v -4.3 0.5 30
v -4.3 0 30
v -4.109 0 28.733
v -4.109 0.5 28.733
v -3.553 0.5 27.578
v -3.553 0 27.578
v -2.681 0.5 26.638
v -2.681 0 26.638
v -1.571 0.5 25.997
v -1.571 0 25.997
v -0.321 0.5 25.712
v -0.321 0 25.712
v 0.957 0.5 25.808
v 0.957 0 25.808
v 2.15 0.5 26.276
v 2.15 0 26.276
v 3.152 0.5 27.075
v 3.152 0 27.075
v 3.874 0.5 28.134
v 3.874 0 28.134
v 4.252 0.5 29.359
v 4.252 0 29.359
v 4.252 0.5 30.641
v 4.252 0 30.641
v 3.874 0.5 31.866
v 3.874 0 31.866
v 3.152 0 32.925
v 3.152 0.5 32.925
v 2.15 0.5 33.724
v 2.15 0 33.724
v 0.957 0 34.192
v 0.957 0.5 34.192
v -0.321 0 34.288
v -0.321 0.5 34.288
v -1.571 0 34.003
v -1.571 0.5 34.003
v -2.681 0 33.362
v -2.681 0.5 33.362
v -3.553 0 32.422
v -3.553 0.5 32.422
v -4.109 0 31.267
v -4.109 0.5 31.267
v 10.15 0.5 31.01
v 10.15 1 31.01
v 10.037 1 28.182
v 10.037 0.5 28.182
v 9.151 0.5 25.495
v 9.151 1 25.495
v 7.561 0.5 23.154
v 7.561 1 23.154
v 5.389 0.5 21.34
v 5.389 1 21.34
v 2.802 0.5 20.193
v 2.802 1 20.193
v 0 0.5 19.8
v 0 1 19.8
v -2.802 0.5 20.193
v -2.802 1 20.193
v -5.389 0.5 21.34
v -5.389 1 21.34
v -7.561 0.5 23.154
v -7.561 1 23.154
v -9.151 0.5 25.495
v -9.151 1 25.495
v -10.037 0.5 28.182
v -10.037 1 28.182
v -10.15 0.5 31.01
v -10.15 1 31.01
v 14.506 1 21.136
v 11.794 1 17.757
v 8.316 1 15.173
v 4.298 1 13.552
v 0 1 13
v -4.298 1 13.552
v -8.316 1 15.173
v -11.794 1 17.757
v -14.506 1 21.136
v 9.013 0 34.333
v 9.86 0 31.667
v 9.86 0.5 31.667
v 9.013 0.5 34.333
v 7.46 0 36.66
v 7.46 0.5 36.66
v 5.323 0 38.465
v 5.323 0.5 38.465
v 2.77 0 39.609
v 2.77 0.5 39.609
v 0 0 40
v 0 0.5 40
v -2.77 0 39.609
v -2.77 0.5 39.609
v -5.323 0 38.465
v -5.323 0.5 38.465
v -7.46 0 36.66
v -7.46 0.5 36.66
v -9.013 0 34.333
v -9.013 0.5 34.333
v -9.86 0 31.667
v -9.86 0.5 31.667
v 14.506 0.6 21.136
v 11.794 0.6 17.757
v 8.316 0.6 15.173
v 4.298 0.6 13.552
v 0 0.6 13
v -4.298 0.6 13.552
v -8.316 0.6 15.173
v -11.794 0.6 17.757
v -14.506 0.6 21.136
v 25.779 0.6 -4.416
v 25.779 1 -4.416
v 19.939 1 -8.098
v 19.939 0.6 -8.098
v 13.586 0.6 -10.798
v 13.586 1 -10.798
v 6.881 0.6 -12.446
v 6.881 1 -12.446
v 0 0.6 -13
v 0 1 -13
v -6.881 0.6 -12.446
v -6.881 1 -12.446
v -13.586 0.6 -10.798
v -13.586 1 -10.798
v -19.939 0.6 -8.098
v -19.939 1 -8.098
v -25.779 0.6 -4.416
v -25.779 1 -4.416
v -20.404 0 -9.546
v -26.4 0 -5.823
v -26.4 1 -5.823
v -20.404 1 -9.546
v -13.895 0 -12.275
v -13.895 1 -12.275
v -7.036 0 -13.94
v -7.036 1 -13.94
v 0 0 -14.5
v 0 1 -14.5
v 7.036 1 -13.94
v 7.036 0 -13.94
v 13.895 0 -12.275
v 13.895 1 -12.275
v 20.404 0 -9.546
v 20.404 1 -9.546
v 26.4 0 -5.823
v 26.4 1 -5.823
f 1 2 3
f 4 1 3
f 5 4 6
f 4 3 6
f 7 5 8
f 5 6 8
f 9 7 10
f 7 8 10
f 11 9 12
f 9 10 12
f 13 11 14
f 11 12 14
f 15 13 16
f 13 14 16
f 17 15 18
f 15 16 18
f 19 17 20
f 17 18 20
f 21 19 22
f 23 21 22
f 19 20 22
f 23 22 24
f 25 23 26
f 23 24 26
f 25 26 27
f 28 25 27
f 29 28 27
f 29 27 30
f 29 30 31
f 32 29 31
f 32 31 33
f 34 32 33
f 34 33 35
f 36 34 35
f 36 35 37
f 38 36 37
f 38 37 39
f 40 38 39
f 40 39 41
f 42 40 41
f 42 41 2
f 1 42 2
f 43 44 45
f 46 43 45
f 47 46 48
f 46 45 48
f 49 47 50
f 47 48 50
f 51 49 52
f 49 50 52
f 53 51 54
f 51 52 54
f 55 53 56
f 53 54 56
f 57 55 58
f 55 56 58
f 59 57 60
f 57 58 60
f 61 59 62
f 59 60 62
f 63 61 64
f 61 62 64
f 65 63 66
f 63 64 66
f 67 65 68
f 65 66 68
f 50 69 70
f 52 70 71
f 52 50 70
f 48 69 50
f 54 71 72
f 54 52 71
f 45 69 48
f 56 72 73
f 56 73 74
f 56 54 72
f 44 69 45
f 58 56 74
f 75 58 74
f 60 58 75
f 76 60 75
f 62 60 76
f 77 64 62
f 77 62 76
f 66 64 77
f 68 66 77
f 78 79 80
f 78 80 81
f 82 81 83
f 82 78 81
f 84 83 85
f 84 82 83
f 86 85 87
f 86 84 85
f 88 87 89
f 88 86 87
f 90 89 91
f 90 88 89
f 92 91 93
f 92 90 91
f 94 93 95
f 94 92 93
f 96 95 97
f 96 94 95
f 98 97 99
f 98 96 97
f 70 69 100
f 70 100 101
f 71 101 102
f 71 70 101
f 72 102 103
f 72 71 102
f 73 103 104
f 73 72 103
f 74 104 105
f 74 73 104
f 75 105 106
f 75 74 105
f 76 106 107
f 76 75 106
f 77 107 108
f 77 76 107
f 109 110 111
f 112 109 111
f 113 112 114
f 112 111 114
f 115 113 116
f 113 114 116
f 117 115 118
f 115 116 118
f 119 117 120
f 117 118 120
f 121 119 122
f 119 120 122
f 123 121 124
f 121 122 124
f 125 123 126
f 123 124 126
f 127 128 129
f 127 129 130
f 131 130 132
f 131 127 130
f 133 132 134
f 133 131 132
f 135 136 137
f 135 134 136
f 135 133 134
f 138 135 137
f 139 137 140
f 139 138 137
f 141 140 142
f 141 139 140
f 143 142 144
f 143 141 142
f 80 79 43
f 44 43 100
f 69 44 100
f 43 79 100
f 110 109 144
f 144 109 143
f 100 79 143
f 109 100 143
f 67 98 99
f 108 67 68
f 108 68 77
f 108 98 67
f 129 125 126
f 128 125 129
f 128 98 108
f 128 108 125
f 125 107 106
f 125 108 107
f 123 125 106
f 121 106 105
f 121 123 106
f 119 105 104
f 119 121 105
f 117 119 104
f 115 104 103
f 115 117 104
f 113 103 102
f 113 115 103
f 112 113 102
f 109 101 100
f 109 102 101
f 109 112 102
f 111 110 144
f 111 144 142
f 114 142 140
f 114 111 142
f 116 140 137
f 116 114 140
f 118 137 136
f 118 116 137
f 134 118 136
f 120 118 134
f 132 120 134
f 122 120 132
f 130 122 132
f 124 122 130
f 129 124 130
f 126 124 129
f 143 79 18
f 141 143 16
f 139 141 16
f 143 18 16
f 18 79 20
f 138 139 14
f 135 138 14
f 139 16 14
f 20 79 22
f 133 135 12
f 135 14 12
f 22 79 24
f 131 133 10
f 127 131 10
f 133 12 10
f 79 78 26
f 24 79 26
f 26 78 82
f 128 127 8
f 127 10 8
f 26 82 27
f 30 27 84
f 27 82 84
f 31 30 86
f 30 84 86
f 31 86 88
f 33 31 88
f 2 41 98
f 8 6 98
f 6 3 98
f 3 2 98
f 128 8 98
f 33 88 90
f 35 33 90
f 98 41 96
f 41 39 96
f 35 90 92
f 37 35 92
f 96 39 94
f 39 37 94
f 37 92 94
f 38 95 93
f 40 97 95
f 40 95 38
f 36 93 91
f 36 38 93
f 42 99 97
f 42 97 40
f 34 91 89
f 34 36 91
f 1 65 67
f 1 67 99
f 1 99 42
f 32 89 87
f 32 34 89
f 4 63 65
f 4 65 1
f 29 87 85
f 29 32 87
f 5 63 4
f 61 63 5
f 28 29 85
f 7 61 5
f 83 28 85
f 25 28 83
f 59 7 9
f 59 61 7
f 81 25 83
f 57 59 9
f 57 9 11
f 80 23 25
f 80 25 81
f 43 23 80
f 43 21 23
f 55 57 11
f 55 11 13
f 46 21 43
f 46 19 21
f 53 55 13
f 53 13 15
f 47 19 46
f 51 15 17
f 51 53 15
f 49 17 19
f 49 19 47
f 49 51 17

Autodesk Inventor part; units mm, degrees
ref_plane "YZ Plane" through (0, 0, 0) normal (1, 0, 0) x (0, 1, 0)
ref_plane "XZ Plane" through (0, 0, 0) normal (0, 1, 0) x (-1, 0, 0)
ref_plane "XY Plane" through (0, 0, 0) normal (0, 0, 1) x (1, 0, 0)
sketch "Sketch1" plane through (0, 0, 0) normal (0, 1, 0) x (-1, 0, 0)
  circle A0 centre (0, 0) radius 74.5 construction
  circle A1 centre (0, 30) radius 44.5 construction
  circle A2 centre (0, 30) radius 4.3
  circle A3 centre (0, 30) radius 10 construction
  arc A4 (9.8601, 31.6667) -> (-9.8601, 31.6667) centre (0, 30) ccw construction
  line L0 (0, -104.3) -> (0, 104.3) construction
  arc A5 (9.8601, 31.6667) -> (-9.8601, 31.6667) centre (0, 30) ccw
  line L1 (9.8601, 31.6667) -> (26.4003, -5.8228)
  arc A6 (-26.4003, -5.8228) -> (26.4003, -5.8228) centre (0, 30) ccw
  line L2 (-9.8601, 31.6667) -> (-26.4003, -5.8228)
  dimension "d5" = 20
  dimension "d0" = 149
  dimension "d3" = 30
  dimension "d4" = 8.6
extrude "Extrusion1" add sketch "Sketch1" along normal blind 1
sketch "Sketch2" plane through (0, 1, 0) normal (0, 1, 0) x (1, 0, 0)
  circle A0 centre (0, -30) radius 4.3 construction
  circle A1 centre (0, -30) radius 10.2
  point P0 (0, 0)
  dimension "d8" = 20.4
extrude "Extrusion2" cut sketch "Sketch2" against normal blind 0.5
sketch "Sketch3" plane through (0, 1, 0) normal (0, 1, 0) x (1, 0, 0)
  circle A0 centre (0, -30) radius 4.3 construction
  line L0 (9.8601, -31.6667) -> (26.4003, 5.8228) construction
  circle A1 centre (0, -30) radius 4.3 construction
  arc A2 (25.9919, 4.2553) -> (-25.7794, 4.4155) centre (0, -30) ccw
  arc A3 (14.5062, -21.136) -> (-14.5062, -21.136) centre (0, -30) ccw
  line L1 (14.5062, -21.136) -> (25.9919, 4.2553)
  line L2 (-26.4003, 5.8228) -> (-9.8601, -31.6667) projected
  line L3 (-14.5062, -21.136) -> (-25.7794, 4.4155)
  point P0 (0, 0)
  point P1 (-25.7794, 4.4155)
  dimension "d12" = 43
  dimension "d13" = 17
extrude "Extrusion3" cut sketch "Sketch3" against normal blind 0.4
properties part number "shutter"
